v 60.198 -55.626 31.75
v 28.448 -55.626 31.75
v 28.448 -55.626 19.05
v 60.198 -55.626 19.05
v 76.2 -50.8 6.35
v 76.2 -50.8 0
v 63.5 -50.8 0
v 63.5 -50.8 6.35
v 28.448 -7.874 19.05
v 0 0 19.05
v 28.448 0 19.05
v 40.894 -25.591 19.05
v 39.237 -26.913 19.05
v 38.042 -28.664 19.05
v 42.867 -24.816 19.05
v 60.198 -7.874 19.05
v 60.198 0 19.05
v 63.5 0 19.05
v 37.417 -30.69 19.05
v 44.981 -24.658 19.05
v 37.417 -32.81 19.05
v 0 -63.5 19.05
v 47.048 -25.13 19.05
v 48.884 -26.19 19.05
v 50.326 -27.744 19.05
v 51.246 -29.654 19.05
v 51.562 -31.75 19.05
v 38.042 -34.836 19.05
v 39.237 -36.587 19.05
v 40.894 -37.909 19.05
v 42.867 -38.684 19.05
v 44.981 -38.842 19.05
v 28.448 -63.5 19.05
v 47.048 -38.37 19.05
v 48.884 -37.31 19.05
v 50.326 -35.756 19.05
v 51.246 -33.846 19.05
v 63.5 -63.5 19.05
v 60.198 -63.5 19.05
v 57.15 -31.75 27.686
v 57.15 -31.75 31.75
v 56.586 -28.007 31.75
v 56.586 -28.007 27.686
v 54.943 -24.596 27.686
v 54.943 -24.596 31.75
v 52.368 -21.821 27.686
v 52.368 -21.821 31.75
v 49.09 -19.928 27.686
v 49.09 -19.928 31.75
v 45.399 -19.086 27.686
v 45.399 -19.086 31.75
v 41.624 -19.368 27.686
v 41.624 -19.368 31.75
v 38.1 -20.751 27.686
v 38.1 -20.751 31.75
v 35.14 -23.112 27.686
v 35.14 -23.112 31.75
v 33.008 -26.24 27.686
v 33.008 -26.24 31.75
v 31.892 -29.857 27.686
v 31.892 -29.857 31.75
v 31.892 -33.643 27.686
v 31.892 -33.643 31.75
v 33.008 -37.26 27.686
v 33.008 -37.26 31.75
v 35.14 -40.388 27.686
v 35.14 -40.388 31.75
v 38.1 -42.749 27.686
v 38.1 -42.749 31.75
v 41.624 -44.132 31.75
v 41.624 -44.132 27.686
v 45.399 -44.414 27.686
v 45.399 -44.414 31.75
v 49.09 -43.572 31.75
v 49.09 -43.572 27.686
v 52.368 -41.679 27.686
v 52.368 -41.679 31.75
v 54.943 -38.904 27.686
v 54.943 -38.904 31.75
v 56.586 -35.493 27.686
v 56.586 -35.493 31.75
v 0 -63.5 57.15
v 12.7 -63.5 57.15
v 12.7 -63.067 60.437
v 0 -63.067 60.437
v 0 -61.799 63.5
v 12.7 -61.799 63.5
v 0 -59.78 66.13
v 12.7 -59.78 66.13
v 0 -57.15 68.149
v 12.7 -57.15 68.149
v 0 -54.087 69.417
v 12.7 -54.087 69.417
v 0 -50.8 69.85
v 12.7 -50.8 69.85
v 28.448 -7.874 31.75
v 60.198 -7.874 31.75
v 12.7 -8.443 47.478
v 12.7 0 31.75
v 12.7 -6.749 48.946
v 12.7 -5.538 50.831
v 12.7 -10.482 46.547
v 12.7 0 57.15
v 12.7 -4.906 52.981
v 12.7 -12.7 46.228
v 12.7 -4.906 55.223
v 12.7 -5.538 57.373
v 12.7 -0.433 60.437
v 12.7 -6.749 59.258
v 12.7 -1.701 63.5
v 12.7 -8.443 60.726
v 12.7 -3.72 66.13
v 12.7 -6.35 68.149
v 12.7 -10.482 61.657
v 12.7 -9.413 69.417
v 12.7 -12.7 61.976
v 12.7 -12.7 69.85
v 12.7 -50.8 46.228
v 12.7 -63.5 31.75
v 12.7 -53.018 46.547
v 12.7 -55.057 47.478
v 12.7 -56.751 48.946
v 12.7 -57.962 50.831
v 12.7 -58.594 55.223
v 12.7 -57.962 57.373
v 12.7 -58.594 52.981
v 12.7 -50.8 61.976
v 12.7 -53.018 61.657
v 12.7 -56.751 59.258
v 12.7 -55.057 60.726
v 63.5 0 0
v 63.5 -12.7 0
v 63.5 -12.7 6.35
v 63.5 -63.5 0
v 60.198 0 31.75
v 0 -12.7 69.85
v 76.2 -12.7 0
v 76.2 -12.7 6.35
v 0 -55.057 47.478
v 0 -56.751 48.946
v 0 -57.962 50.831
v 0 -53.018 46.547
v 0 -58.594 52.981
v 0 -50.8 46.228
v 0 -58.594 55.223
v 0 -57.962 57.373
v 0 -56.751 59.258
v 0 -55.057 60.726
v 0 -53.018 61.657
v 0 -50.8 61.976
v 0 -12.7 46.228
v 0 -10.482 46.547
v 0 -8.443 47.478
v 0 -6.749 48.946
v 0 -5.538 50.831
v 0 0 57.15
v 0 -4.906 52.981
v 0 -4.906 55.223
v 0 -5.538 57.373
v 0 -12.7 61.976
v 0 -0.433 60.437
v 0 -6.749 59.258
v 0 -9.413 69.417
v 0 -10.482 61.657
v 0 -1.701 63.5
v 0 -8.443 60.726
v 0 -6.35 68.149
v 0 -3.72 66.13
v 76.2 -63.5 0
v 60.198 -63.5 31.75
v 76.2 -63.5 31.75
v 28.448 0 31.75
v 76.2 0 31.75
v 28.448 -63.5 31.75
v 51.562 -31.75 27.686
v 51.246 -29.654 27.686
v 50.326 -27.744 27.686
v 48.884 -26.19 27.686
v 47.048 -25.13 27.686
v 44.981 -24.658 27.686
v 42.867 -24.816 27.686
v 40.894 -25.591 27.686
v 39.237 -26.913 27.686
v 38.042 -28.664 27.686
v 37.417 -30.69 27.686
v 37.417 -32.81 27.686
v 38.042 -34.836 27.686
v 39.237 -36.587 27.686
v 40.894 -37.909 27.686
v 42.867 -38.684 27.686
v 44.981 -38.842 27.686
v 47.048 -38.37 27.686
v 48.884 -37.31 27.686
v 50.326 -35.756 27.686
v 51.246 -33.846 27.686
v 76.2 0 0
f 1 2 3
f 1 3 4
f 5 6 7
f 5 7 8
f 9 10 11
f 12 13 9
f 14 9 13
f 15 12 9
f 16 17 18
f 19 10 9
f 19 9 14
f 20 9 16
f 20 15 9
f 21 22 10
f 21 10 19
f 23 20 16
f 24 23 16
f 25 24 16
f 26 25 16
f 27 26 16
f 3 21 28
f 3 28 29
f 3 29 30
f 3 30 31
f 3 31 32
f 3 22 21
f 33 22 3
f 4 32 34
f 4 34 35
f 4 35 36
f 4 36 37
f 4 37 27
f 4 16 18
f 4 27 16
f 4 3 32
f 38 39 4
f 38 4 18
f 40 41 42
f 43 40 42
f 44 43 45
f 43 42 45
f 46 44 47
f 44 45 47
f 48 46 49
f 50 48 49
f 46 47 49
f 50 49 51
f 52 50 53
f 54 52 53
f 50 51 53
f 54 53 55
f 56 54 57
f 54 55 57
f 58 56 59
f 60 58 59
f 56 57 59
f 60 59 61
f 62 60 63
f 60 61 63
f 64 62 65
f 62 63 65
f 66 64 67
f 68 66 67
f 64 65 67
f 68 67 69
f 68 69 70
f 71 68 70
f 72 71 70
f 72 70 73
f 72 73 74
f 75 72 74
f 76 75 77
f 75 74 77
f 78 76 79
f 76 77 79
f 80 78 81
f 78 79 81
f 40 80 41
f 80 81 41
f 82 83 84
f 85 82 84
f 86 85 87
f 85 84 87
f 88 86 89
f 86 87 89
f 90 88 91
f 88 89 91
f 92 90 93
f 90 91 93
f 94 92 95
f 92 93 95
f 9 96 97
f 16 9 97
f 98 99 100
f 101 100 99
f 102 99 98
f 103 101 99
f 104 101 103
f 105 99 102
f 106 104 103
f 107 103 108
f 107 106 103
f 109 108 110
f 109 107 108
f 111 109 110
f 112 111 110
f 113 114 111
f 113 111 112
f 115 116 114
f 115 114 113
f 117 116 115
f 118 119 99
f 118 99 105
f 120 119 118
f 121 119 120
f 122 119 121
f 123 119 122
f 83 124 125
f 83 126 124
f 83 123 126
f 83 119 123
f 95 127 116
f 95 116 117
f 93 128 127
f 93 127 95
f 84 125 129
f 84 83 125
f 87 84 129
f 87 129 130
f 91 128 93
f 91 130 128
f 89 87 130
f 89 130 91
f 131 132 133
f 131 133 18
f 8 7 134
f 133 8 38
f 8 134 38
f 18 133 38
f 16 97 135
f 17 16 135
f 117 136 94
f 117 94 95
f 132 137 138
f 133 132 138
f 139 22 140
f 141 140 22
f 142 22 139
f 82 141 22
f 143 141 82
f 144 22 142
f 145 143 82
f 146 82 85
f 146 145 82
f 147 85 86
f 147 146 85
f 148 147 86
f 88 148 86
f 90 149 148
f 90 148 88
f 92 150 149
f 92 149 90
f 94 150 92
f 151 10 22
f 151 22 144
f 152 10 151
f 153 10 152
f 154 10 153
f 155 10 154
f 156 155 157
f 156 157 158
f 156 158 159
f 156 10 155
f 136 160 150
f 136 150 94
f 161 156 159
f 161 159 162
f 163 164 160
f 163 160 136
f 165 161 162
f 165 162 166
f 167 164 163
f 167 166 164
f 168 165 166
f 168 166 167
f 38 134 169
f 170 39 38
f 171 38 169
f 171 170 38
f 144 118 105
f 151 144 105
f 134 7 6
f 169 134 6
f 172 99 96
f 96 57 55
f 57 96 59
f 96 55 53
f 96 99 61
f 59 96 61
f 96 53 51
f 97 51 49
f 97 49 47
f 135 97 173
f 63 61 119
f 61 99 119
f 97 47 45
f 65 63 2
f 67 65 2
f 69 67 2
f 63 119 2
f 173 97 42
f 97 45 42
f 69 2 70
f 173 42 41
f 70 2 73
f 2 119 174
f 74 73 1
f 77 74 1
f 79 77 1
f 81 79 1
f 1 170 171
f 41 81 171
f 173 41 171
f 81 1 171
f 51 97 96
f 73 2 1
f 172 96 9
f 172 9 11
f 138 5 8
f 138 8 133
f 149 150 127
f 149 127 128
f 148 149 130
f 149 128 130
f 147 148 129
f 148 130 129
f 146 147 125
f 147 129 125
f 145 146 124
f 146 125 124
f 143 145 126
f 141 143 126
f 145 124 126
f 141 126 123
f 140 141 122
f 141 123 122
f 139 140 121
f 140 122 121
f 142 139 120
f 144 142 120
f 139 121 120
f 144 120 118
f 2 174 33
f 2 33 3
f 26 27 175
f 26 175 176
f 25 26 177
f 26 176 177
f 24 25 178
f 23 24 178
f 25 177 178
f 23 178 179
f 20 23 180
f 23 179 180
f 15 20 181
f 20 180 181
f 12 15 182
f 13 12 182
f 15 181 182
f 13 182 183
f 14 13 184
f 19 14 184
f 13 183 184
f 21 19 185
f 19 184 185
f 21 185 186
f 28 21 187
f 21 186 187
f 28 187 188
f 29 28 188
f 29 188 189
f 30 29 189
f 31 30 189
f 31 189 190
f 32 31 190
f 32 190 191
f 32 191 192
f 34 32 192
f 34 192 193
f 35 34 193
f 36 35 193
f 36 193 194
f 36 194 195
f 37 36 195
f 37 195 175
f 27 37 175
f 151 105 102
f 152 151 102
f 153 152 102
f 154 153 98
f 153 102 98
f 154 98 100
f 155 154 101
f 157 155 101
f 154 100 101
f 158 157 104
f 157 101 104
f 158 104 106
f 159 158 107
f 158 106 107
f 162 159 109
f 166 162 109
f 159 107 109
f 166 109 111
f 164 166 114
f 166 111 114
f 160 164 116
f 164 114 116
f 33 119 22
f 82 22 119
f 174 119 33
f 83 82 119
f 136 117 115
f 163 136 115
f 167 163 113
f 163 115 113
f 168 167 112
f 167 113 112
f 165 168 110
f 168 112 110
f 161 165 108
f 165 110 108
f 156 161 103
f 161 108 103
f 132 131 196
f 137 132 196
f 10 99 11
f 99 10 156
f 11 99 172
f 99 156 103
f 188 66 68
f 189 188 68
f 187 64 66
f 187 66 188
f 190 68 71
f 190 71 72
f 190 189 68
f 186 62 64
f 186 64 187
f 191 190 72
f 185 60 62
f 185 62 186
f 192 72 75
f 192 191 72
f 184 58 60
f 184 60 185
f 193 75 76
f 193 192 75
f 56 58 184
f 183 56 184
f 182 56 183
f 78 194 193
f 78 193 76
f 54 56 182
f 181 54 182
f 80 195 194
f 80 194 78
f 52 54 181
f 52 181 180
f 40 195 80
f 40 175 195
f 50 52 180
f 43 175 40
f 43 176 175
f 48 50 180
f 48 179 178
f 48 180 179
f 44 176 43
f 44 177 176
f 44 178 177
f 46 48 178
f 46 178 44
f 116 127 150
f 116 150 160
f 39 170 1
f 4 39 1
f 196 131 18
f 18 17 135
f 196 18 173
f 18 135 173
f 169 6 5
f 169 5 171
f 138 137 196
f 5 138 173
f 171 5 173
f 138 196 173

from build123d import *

# Parameters (mm, degrees)
F0_W       = 76.2
F0_H       = 69.85
F1_DEPTH   = 63.5
F2_W       = 38.1
F2_H       = 6.35
F3_DEPTH   = 76.201
F4_W       = 63.5
F4_H       = 19.05
F5_DEPTH   = 63.501
F6_W       = 63.5
F6_H       = 38.1
F7_DEPTH   = 63.501
F8_W       = 31.75
F8_H       = 7.874
F9_DEPTH   = 25.4
F11_DEPTH  = 25.4
F12_W      = 38.1
F12_H      = 15.748
F13_DEPTH  = 12.701
F14_R      = 12.7
F14_R_2    = 7.112
F15_DEPTH  = 4.064
F15_FACE_R = 7.112
F16_DEPTH  = 31.751


with BuildPart() as f1:
    # F0 (on Front) → F1 (new body)
    with BuildSketch(Plane.XZ):
        with Locations((38.1, 34.925)):
            Rectangle(F0_W, F0_H)
    extrude(amount=F1_DEPTH)

    # F2 (on face) → F3 (cut, through all)
    with BuildSketch(Plane.YZ.offset(76.2)):
        with Locations((-31.75, 3.175)):
            Rectangle(F2_W, F2_H)
    extrude(amount=-F3_DEPTH, mode=Mode.SUBTRACT)

    # F4 (on face) → F5 (cut, through all)
    with BuildSketch(Plane.XZ.offset(63.5)):
        with Locations((31.75, 9.525)):
            Rectangle(F4_W, F4_H)
    extrude(amount=-F5_DEPTH, mode=Mode.SUBTRACT)

    # F6 (on face) → F7 (cut, through all)
    with BuildSketch(Plane.XZ.offset(63.5)):
        with Locations((44.45, 50.8)):
            Rectangle(F6_W, F6_H)
    extrude(amount=-F7_DEPTH, mode=Mode.SUBTRACT)

    # F8 (on face) → F9 (cut)
    with BuildSketch(Plane.XY.offset(31.75)):
        with Locations((44.323, -59.563)):
            Rectangle(F8_W, F8_H)
        with Locations((44.323, -3.937)):
            Rectangle(F8_W, F8_H)
    extrude(amount=-F9_DEPTH, mode=Mode.SUBTRACT)

    # F10 (on face) → F11 (cut)
    with BuildSketch(Plane.YZ.offset(12.7)):
        with BuildLine():
            ThreePointArc((-63.5, 57.15), (-59.780256, 66.130256), (-50.8, 69.85))
            Line((-50.8, 69.85), (-63.5, 69.85))
            Line((-63.5, 69.85), (-63.5, 57.15))
        make_face()
        with BuildLine():
            Line((0, 69.85), (-12.7, 69.85))
            ThreePointArc((-12.7, 69.85), (-3.719744, 66.130256), (0, 57.15))
            Line((0, 57.15), (0, 69.85))
        make_face()
    extrude(amount=-F11_DEPTH, mode=Mode.SUBTRACT)

    # F12 (on face) → F13 (cut, through all)
    with BuildSketch(Plane.YZ.offset(12.7)):
        with Locations((-31.75, 54.102)):
            Rectangle(F12_W, F12_H)
        with BuildLine():
            Line((-50.8, 46.228), (-50.8, 61.976))
            ThreePointArc((-50.8, 61.976), (-58.674, 54.102), (-50.8, 46.228))
        make_face()
        with BuildLine():
            ThreePointArc((-12.7, 46.228), (-4.826, 54.102), (-12.7, 61.976))
            Line((-12.7, 61.976), (-12.7, 46.228))
        make_face()
    extrude(amount=-F13_DEPTH, mode=Mode.SUBTRACT)

    # F14 (on face) → F15 (cut)
    with BuildSketch(Plane.XY.offset(31.75)):
        with Locations((44.45, -31.75)):
            Circle(F14_R)
        with Locations((44.45, -31.75)):
            Circle(F14_R_2, mode=Mode.SUBTRACT)
    extrude(amount=-F15_DEPTH, mode=Mode.SUBTRACT)

    # F15_face (on face) → F16 (cut, through all)
    with BuildSketch(Plane(origin=(44.45, -31.75, 31.75), x_dir=(1, 0, 0), z_dir=(0, 0, 1))):
        Circle(F15_FACE_R)
    extrude(amount=-F16_DEPTH, mode=Mode.SUBTRACT)


solid = f1.part
